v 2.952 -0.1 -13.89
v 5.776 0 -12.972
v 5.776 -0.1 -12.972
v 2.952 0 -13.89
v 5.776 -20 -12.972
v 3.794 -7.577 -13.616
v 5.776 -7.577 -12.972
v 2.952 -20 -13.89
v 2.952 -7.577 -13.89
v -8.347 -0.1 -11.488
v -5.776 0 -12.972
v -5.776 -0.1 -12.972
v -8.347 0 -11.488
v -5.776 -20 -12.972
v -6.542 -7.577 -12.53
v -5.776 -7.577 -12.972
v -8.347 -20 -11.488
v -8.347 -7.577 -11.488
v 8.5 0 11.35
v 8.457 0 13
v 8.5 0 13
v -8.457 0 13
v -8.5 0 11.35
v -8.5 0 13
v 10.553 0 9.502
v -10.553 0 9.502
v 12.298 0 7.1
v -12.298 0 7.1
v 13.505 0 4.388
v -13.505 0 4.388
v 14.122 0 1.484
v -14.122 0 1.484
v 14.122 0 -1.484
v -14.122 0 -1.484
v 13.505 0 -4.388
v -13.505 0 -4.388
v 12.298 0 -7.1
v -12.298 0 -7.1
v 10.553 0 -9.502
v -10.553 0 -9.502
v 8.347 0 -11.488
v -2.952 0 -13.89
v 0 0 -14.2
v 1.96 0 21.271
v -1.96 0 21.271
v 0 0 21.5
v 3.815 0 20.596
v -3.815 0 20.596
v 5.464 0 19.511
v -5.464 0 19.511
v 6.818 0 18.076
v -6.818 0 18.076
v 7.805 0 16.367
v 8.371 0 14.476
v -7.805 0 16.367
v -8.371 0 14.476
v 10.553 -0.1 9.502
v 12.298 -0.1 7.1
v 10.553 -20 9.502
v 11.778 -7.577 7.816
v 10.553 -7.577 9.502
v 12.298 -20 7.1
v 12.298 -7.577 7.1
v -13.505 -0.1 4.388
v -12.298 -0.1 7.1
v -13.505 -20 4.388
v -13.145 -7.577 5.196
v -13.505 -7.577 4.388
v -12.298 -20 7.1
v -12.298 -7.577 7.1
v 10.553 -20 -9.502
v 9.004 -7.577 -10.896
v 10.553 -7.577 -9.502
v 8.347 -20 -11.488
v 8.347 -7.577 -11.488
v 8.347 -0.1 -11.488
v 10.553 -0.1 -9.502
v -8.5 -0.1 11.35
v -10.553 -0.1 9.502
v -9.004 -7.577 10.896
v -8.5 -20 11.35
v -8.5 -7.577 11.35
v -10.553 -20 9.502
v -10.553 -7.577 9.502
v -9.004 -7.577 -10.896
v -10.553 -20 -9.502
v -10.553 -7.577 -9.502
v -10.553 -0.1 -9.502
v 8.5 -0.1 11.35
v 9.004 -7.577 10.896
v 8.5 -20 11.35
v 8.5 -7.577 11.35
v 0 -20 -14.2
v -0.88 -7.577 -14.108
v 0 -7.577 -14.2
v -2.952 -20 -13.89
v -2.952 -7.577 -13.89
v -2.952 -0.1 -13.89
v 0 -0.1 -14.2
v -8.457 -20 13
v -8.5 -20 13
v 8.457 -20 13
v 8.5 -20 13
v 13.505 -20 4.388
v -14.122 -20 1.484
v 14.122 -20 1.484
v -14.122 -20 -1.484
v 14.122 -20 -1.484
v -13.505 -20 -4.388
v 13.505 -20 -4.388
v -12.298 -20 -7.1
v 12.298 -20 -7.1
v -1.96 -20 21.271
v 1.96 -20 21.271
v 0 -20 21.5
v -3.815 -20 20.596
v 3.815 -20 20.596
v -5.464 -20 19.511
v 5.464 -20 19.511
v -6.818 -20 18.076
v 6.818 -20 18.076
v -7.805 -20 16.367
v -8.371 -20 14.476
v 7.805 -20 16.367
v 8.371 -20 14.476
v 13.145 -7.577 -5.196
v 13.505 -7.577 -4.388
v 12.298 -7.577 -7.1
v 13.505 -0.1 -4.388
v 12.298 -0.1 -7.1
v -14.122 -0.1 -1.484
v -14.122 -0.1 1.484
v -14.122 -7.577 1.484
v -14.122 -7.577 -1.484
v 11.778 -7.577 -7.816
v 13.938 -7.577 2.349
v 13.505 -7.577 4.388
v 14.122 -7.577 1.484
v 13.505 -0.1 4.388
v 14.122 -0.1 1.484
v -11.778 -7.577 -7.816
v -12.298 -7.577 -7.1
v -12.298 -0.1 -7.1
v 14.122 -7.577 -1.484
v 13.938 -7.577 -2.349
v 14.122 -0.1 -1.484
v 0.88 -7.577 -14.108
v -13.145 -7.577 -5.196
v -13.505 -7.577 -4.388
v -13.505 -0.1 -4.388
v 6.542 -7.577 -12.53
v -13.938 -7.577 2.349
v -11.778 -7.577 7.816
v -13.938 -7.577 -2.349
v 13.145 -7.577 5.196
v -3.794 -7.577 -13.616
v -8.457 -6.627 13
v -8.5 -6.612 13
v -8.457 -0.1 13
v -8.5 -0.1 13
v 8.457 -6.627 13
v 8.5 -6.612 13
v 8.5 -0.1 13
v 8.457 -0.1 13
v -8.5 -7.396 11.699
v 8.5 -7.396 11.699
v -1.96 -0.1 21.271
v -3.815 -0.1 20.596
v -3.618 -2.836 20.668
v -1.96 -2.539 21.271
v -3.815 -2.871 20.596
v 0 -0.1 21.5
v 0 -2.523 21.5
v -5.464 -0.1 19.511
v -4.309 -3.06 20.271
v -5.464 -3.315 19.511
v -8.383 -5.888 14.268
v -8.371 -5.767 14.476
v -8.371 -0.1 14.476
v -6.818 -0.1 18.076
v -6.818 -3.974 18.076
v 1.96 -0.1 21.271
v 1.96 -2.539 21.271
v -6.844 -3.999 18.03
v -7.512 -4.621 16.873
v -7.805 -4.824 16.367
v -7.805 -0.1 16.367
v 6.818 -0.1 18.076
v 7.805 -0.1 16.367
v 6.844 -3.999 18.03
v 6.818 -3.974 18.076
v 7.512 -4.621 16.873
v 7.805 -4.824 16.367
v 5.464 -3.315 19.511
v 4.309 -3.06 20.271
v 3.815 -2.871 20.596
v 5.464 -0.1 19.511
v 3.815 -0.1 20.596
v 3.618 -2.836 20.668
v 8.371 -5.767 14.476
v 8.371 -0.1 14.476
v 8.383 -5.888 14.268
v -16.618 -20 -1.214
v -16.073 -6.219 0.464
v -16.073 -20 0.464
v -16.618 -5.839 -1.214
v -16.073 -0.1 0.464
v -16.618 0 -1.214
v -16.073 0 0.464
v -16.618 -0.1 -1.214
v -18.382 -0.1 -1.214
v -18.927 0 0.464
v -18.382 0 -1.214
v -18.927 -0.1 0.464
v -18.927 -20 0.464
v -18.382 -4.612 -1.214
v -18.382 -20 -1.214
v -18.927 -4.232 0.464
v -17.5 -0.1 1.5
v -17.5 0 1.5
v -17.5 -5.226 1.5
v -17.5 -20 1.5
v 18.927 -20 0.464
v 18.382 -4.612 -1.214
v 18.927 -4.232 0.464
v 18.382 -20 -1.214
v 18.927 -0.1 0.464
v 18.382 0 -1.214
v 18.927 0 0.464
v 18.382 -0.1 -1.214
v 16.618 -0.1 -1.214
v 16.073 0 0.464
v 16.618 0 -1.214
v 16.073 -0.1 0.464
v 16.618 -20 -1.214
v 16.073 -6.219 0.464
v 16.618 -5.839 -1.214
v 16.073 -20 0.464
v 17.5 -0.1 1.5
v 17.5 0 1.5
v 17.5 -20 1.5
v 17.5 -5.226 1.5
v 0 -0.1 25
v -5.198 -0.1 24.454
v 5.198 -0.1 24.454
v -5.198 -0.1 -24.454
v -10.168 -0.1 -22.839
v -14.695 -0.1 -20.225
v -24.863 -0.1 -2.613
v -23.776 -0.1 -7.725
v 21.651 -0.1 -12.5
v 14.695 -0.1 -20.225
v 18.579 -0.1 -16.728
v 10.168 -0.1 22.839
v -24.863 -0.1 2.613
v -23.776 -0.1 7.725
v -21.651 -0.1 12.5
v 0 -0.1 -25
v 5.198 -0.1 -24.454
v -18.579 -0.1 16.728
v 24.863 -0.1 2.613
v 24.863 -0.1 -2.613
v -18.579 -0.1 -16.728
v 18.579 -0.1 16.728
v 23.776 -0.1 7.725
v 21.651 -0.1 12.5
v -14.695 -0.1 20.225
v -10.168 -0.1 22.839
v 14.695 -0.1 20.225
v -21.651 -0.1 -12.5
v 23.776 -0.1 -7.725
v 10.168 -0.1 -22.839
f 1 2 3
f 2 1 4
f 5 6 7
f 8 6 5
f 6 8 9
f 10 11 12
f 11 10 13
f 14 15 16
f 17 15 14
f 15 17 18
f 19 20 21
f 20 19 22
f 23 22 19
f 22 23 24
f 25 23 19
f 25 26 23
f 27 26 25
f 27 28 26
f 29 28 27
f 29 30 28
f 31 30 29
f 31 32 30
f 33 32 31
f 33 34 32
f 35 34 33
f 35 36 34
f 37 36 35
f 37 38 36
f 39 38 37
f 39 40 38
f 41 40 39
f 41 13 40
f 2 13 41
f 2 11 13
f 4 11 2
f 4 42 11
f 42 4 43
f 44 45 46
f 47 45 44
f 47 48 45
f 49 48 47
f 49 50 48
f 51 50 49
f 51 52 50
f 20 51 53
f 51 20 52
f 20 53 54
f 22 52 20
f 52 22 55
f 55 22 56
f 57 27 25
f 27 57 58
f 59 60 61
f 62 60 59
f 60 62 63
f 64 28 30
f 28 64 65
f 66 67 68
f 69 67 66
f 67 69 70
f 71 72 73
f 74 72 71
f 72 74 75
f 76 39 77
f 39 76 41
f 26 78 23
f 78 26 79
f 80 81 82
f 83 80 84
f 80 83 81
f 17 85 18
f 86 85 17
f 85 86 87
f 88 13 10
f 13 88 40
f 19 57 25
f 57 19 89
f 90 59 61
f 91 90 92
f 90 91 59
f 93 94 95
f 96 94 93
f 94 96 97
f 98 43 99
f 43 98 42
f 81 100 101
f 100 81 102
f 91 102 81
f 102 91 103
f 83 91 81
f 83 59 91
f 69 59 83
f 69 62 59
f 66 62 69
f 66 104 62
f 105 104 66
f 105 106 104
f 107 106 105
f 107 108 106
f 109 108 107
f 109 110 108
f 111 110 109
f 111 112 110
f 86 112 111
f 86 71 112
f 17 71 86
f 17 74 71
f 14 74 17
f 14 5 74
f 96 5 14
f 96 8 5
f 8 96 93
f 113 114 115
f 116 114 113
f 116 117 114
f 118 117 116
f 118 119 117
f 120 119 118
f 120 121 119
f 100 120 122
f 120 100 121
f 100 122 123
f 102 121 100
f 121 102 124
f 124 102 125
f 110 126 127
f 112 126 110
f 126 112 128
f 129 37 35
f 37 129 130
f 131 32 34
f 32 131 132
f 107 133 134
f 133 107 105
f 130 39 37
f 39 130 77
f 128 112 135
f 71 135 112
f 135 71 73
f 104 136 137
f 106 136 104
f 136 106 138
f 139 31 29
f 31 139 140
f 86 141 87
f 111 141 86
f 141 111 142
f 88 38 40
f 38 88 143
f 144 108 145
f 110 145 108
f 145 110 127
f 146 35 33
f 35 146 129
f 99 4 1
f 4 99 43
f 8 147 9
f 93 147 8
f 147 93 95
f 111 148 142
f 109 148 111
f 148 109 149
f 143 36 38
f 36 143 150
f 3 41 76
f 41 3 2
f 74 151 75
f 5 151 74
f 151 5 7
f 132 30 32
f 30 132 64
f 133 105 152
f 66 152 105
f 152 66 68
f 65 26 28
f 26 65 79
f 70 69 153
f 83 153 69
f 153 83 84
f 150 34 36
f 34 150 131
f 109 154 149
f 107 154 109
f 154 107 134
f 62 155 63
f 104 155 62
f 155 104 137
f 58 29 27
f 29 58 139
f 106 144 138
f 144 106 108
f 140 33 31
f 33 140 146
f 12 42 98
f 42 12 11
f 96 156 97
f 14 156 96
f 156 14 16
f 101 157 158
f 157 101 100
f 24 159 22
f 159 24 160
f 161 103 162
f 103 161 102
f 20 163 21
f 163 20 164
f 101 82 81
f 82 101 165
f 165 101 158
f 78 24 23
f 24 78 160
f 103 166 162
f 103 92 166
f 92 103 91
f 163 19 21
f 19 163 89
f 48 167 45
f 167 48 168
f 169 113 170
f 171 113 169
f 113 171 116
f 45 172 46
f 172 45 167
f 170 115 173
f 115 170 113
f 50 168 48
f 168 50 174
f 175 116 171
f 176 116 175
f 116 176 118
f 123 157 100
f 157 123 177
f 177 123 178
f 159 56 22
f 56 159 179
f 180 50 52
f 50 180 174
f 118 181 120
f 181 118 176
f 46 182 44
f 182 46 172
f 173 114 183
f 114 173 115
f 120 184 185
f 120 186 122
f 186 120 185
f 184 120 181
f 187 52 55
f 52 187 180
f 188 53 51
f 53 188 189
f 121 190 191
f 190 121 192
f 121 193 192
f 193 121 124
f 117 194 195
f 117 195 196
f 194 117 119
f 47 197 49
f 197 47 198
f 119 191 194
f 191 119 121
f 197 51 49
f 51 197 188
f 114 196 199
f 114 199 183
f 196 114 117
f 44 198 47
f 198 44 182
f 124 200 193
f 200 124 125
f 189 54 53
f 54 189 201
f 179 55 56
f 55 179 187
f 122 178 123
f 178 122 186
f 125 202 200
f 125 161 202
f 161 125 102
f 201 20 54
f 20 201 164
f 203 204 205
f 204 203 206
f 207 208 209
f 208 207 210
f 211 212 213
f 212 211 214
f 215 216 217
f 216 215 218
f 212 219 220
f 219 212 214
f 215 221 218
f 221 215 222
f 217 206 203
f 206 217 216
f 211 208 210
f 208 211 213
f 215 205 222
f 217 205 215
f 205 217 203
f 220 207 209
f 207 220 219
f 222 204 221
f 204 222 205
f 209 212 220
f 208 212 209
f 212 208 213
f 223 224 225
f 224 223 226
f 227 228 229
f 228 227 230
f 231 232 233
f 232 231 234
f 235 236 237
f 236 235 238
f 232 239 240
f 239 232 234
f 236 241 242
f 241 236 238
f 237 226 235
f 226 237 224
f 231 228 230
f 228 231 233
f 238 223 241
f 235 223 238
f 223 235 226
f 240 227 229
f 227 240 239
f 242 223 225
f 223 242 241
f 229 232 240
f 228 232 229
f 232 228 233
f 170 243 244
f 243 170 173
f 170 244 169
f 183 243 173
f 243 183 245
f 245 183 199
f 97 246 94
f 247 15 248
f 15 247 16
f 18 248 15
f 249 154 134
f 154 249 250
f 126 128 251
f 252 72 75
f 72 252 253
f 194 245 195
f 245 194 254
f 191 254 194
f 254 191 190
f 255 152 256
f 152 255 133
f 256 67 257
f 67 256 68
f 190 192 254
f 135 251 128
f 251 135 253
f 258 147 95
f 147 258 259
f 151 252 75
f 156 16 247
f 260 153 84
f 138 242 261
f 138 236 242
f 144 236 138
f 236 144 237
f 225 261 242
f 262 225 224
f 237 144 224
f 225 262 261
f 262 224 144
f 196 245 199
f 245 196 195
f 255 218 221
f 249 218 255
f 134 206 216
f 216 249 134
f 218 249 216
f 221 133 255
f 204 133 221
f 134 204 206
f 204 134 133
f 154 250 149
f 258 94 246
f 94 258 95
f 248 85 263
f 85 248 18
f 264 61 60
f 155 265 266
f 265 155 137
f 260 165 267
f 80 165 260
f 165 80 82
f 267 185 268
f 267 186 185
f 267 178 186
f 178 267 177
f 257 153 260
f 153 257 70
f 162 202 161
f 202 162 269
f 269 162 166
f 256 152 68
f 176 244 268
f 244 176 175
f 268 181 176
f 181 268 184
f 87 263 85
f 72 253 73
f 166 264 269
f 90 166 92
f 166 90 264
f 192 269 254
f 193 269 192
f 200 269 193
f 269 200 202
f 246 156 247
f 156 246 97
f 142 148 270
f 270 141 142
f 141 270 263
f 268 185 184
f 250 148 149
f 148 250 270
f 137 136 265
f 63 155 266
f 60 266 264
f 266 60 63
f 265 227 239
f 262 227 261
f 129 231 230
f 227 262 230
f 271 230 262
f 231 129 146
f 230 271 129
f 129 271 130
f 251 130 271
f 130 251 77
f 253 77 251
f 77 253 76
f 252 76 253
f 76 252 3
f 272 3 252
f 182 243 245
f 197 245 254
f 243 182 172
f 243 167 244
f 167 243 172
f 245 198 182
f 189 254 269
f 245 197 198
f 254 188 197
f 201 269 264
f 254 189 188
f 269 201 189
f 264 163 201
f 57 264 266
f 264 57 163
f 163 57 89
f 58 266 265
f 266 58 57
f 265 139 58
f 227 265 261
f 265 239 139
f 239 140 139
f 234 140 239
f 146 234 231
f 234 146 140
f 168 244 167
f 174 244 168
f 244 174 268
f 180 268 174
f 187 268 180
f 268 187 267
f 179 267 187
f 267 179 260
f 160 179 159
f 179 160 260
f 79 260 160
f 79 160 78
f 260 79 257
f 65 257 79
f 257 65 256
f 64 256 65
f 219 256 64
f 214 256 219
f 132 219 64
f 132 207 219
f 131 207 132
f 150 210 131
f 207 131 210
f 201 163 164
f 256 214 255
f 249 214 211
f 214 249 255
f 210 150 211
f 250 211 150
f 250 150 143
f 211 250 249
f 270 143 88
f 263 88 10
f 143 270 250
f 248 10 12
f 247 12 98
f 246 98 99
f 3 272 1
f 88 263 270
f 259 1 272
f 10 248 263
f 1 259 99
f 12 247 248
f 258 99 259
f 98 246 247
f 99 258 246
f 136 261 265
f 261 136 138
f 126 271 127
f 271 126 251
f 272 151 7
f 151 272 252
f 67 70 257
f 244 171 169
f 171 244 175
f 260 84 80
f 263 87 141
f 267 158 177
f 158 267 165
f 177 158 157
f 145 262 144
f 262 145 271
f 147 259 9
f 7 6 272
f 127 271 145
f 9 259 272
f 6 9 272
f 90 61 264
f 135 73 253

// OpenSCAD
module 28BYJ(support = false, screw_hole=false, motor=true) {
    h = 20;
    
      rotate([0, 270, 90])
    {
        if( motor) {
            union() {
              color("grey")
              cylinder(r1=14.2, r2=14.2, h, center=false);
              
              color("lightBlue")
              translate([0, -8.5, 0])
              cube([13, 17, h], center=false);

              color("cyan")
              translate([13, 0, 0])
              cylinder(r1=8.5, r2=8.5, h, center=false);
            }
        }
          
        color("cyan")
        if( screw_hole) {
          translate([0, 17.5, 0])
          cylinder(r1=1.5, r2=1.5, h, center=false);
          
          translate([0, -17.5, 0])
          cylinder(r1=1.5, r2=1.5, h, center=false);
        }
        
        if( support) { union() {
            z = 3;
            translate([0, 0, 0.1])
            cylinder(r1=25, r2=12, h=9, center=false);
            //translate([0, 0, z])
            //cylinder(r1=20, r2=12, h=6, center=false);
        } }
    }
}

28BYJ( support=true, screw_hole=true);
